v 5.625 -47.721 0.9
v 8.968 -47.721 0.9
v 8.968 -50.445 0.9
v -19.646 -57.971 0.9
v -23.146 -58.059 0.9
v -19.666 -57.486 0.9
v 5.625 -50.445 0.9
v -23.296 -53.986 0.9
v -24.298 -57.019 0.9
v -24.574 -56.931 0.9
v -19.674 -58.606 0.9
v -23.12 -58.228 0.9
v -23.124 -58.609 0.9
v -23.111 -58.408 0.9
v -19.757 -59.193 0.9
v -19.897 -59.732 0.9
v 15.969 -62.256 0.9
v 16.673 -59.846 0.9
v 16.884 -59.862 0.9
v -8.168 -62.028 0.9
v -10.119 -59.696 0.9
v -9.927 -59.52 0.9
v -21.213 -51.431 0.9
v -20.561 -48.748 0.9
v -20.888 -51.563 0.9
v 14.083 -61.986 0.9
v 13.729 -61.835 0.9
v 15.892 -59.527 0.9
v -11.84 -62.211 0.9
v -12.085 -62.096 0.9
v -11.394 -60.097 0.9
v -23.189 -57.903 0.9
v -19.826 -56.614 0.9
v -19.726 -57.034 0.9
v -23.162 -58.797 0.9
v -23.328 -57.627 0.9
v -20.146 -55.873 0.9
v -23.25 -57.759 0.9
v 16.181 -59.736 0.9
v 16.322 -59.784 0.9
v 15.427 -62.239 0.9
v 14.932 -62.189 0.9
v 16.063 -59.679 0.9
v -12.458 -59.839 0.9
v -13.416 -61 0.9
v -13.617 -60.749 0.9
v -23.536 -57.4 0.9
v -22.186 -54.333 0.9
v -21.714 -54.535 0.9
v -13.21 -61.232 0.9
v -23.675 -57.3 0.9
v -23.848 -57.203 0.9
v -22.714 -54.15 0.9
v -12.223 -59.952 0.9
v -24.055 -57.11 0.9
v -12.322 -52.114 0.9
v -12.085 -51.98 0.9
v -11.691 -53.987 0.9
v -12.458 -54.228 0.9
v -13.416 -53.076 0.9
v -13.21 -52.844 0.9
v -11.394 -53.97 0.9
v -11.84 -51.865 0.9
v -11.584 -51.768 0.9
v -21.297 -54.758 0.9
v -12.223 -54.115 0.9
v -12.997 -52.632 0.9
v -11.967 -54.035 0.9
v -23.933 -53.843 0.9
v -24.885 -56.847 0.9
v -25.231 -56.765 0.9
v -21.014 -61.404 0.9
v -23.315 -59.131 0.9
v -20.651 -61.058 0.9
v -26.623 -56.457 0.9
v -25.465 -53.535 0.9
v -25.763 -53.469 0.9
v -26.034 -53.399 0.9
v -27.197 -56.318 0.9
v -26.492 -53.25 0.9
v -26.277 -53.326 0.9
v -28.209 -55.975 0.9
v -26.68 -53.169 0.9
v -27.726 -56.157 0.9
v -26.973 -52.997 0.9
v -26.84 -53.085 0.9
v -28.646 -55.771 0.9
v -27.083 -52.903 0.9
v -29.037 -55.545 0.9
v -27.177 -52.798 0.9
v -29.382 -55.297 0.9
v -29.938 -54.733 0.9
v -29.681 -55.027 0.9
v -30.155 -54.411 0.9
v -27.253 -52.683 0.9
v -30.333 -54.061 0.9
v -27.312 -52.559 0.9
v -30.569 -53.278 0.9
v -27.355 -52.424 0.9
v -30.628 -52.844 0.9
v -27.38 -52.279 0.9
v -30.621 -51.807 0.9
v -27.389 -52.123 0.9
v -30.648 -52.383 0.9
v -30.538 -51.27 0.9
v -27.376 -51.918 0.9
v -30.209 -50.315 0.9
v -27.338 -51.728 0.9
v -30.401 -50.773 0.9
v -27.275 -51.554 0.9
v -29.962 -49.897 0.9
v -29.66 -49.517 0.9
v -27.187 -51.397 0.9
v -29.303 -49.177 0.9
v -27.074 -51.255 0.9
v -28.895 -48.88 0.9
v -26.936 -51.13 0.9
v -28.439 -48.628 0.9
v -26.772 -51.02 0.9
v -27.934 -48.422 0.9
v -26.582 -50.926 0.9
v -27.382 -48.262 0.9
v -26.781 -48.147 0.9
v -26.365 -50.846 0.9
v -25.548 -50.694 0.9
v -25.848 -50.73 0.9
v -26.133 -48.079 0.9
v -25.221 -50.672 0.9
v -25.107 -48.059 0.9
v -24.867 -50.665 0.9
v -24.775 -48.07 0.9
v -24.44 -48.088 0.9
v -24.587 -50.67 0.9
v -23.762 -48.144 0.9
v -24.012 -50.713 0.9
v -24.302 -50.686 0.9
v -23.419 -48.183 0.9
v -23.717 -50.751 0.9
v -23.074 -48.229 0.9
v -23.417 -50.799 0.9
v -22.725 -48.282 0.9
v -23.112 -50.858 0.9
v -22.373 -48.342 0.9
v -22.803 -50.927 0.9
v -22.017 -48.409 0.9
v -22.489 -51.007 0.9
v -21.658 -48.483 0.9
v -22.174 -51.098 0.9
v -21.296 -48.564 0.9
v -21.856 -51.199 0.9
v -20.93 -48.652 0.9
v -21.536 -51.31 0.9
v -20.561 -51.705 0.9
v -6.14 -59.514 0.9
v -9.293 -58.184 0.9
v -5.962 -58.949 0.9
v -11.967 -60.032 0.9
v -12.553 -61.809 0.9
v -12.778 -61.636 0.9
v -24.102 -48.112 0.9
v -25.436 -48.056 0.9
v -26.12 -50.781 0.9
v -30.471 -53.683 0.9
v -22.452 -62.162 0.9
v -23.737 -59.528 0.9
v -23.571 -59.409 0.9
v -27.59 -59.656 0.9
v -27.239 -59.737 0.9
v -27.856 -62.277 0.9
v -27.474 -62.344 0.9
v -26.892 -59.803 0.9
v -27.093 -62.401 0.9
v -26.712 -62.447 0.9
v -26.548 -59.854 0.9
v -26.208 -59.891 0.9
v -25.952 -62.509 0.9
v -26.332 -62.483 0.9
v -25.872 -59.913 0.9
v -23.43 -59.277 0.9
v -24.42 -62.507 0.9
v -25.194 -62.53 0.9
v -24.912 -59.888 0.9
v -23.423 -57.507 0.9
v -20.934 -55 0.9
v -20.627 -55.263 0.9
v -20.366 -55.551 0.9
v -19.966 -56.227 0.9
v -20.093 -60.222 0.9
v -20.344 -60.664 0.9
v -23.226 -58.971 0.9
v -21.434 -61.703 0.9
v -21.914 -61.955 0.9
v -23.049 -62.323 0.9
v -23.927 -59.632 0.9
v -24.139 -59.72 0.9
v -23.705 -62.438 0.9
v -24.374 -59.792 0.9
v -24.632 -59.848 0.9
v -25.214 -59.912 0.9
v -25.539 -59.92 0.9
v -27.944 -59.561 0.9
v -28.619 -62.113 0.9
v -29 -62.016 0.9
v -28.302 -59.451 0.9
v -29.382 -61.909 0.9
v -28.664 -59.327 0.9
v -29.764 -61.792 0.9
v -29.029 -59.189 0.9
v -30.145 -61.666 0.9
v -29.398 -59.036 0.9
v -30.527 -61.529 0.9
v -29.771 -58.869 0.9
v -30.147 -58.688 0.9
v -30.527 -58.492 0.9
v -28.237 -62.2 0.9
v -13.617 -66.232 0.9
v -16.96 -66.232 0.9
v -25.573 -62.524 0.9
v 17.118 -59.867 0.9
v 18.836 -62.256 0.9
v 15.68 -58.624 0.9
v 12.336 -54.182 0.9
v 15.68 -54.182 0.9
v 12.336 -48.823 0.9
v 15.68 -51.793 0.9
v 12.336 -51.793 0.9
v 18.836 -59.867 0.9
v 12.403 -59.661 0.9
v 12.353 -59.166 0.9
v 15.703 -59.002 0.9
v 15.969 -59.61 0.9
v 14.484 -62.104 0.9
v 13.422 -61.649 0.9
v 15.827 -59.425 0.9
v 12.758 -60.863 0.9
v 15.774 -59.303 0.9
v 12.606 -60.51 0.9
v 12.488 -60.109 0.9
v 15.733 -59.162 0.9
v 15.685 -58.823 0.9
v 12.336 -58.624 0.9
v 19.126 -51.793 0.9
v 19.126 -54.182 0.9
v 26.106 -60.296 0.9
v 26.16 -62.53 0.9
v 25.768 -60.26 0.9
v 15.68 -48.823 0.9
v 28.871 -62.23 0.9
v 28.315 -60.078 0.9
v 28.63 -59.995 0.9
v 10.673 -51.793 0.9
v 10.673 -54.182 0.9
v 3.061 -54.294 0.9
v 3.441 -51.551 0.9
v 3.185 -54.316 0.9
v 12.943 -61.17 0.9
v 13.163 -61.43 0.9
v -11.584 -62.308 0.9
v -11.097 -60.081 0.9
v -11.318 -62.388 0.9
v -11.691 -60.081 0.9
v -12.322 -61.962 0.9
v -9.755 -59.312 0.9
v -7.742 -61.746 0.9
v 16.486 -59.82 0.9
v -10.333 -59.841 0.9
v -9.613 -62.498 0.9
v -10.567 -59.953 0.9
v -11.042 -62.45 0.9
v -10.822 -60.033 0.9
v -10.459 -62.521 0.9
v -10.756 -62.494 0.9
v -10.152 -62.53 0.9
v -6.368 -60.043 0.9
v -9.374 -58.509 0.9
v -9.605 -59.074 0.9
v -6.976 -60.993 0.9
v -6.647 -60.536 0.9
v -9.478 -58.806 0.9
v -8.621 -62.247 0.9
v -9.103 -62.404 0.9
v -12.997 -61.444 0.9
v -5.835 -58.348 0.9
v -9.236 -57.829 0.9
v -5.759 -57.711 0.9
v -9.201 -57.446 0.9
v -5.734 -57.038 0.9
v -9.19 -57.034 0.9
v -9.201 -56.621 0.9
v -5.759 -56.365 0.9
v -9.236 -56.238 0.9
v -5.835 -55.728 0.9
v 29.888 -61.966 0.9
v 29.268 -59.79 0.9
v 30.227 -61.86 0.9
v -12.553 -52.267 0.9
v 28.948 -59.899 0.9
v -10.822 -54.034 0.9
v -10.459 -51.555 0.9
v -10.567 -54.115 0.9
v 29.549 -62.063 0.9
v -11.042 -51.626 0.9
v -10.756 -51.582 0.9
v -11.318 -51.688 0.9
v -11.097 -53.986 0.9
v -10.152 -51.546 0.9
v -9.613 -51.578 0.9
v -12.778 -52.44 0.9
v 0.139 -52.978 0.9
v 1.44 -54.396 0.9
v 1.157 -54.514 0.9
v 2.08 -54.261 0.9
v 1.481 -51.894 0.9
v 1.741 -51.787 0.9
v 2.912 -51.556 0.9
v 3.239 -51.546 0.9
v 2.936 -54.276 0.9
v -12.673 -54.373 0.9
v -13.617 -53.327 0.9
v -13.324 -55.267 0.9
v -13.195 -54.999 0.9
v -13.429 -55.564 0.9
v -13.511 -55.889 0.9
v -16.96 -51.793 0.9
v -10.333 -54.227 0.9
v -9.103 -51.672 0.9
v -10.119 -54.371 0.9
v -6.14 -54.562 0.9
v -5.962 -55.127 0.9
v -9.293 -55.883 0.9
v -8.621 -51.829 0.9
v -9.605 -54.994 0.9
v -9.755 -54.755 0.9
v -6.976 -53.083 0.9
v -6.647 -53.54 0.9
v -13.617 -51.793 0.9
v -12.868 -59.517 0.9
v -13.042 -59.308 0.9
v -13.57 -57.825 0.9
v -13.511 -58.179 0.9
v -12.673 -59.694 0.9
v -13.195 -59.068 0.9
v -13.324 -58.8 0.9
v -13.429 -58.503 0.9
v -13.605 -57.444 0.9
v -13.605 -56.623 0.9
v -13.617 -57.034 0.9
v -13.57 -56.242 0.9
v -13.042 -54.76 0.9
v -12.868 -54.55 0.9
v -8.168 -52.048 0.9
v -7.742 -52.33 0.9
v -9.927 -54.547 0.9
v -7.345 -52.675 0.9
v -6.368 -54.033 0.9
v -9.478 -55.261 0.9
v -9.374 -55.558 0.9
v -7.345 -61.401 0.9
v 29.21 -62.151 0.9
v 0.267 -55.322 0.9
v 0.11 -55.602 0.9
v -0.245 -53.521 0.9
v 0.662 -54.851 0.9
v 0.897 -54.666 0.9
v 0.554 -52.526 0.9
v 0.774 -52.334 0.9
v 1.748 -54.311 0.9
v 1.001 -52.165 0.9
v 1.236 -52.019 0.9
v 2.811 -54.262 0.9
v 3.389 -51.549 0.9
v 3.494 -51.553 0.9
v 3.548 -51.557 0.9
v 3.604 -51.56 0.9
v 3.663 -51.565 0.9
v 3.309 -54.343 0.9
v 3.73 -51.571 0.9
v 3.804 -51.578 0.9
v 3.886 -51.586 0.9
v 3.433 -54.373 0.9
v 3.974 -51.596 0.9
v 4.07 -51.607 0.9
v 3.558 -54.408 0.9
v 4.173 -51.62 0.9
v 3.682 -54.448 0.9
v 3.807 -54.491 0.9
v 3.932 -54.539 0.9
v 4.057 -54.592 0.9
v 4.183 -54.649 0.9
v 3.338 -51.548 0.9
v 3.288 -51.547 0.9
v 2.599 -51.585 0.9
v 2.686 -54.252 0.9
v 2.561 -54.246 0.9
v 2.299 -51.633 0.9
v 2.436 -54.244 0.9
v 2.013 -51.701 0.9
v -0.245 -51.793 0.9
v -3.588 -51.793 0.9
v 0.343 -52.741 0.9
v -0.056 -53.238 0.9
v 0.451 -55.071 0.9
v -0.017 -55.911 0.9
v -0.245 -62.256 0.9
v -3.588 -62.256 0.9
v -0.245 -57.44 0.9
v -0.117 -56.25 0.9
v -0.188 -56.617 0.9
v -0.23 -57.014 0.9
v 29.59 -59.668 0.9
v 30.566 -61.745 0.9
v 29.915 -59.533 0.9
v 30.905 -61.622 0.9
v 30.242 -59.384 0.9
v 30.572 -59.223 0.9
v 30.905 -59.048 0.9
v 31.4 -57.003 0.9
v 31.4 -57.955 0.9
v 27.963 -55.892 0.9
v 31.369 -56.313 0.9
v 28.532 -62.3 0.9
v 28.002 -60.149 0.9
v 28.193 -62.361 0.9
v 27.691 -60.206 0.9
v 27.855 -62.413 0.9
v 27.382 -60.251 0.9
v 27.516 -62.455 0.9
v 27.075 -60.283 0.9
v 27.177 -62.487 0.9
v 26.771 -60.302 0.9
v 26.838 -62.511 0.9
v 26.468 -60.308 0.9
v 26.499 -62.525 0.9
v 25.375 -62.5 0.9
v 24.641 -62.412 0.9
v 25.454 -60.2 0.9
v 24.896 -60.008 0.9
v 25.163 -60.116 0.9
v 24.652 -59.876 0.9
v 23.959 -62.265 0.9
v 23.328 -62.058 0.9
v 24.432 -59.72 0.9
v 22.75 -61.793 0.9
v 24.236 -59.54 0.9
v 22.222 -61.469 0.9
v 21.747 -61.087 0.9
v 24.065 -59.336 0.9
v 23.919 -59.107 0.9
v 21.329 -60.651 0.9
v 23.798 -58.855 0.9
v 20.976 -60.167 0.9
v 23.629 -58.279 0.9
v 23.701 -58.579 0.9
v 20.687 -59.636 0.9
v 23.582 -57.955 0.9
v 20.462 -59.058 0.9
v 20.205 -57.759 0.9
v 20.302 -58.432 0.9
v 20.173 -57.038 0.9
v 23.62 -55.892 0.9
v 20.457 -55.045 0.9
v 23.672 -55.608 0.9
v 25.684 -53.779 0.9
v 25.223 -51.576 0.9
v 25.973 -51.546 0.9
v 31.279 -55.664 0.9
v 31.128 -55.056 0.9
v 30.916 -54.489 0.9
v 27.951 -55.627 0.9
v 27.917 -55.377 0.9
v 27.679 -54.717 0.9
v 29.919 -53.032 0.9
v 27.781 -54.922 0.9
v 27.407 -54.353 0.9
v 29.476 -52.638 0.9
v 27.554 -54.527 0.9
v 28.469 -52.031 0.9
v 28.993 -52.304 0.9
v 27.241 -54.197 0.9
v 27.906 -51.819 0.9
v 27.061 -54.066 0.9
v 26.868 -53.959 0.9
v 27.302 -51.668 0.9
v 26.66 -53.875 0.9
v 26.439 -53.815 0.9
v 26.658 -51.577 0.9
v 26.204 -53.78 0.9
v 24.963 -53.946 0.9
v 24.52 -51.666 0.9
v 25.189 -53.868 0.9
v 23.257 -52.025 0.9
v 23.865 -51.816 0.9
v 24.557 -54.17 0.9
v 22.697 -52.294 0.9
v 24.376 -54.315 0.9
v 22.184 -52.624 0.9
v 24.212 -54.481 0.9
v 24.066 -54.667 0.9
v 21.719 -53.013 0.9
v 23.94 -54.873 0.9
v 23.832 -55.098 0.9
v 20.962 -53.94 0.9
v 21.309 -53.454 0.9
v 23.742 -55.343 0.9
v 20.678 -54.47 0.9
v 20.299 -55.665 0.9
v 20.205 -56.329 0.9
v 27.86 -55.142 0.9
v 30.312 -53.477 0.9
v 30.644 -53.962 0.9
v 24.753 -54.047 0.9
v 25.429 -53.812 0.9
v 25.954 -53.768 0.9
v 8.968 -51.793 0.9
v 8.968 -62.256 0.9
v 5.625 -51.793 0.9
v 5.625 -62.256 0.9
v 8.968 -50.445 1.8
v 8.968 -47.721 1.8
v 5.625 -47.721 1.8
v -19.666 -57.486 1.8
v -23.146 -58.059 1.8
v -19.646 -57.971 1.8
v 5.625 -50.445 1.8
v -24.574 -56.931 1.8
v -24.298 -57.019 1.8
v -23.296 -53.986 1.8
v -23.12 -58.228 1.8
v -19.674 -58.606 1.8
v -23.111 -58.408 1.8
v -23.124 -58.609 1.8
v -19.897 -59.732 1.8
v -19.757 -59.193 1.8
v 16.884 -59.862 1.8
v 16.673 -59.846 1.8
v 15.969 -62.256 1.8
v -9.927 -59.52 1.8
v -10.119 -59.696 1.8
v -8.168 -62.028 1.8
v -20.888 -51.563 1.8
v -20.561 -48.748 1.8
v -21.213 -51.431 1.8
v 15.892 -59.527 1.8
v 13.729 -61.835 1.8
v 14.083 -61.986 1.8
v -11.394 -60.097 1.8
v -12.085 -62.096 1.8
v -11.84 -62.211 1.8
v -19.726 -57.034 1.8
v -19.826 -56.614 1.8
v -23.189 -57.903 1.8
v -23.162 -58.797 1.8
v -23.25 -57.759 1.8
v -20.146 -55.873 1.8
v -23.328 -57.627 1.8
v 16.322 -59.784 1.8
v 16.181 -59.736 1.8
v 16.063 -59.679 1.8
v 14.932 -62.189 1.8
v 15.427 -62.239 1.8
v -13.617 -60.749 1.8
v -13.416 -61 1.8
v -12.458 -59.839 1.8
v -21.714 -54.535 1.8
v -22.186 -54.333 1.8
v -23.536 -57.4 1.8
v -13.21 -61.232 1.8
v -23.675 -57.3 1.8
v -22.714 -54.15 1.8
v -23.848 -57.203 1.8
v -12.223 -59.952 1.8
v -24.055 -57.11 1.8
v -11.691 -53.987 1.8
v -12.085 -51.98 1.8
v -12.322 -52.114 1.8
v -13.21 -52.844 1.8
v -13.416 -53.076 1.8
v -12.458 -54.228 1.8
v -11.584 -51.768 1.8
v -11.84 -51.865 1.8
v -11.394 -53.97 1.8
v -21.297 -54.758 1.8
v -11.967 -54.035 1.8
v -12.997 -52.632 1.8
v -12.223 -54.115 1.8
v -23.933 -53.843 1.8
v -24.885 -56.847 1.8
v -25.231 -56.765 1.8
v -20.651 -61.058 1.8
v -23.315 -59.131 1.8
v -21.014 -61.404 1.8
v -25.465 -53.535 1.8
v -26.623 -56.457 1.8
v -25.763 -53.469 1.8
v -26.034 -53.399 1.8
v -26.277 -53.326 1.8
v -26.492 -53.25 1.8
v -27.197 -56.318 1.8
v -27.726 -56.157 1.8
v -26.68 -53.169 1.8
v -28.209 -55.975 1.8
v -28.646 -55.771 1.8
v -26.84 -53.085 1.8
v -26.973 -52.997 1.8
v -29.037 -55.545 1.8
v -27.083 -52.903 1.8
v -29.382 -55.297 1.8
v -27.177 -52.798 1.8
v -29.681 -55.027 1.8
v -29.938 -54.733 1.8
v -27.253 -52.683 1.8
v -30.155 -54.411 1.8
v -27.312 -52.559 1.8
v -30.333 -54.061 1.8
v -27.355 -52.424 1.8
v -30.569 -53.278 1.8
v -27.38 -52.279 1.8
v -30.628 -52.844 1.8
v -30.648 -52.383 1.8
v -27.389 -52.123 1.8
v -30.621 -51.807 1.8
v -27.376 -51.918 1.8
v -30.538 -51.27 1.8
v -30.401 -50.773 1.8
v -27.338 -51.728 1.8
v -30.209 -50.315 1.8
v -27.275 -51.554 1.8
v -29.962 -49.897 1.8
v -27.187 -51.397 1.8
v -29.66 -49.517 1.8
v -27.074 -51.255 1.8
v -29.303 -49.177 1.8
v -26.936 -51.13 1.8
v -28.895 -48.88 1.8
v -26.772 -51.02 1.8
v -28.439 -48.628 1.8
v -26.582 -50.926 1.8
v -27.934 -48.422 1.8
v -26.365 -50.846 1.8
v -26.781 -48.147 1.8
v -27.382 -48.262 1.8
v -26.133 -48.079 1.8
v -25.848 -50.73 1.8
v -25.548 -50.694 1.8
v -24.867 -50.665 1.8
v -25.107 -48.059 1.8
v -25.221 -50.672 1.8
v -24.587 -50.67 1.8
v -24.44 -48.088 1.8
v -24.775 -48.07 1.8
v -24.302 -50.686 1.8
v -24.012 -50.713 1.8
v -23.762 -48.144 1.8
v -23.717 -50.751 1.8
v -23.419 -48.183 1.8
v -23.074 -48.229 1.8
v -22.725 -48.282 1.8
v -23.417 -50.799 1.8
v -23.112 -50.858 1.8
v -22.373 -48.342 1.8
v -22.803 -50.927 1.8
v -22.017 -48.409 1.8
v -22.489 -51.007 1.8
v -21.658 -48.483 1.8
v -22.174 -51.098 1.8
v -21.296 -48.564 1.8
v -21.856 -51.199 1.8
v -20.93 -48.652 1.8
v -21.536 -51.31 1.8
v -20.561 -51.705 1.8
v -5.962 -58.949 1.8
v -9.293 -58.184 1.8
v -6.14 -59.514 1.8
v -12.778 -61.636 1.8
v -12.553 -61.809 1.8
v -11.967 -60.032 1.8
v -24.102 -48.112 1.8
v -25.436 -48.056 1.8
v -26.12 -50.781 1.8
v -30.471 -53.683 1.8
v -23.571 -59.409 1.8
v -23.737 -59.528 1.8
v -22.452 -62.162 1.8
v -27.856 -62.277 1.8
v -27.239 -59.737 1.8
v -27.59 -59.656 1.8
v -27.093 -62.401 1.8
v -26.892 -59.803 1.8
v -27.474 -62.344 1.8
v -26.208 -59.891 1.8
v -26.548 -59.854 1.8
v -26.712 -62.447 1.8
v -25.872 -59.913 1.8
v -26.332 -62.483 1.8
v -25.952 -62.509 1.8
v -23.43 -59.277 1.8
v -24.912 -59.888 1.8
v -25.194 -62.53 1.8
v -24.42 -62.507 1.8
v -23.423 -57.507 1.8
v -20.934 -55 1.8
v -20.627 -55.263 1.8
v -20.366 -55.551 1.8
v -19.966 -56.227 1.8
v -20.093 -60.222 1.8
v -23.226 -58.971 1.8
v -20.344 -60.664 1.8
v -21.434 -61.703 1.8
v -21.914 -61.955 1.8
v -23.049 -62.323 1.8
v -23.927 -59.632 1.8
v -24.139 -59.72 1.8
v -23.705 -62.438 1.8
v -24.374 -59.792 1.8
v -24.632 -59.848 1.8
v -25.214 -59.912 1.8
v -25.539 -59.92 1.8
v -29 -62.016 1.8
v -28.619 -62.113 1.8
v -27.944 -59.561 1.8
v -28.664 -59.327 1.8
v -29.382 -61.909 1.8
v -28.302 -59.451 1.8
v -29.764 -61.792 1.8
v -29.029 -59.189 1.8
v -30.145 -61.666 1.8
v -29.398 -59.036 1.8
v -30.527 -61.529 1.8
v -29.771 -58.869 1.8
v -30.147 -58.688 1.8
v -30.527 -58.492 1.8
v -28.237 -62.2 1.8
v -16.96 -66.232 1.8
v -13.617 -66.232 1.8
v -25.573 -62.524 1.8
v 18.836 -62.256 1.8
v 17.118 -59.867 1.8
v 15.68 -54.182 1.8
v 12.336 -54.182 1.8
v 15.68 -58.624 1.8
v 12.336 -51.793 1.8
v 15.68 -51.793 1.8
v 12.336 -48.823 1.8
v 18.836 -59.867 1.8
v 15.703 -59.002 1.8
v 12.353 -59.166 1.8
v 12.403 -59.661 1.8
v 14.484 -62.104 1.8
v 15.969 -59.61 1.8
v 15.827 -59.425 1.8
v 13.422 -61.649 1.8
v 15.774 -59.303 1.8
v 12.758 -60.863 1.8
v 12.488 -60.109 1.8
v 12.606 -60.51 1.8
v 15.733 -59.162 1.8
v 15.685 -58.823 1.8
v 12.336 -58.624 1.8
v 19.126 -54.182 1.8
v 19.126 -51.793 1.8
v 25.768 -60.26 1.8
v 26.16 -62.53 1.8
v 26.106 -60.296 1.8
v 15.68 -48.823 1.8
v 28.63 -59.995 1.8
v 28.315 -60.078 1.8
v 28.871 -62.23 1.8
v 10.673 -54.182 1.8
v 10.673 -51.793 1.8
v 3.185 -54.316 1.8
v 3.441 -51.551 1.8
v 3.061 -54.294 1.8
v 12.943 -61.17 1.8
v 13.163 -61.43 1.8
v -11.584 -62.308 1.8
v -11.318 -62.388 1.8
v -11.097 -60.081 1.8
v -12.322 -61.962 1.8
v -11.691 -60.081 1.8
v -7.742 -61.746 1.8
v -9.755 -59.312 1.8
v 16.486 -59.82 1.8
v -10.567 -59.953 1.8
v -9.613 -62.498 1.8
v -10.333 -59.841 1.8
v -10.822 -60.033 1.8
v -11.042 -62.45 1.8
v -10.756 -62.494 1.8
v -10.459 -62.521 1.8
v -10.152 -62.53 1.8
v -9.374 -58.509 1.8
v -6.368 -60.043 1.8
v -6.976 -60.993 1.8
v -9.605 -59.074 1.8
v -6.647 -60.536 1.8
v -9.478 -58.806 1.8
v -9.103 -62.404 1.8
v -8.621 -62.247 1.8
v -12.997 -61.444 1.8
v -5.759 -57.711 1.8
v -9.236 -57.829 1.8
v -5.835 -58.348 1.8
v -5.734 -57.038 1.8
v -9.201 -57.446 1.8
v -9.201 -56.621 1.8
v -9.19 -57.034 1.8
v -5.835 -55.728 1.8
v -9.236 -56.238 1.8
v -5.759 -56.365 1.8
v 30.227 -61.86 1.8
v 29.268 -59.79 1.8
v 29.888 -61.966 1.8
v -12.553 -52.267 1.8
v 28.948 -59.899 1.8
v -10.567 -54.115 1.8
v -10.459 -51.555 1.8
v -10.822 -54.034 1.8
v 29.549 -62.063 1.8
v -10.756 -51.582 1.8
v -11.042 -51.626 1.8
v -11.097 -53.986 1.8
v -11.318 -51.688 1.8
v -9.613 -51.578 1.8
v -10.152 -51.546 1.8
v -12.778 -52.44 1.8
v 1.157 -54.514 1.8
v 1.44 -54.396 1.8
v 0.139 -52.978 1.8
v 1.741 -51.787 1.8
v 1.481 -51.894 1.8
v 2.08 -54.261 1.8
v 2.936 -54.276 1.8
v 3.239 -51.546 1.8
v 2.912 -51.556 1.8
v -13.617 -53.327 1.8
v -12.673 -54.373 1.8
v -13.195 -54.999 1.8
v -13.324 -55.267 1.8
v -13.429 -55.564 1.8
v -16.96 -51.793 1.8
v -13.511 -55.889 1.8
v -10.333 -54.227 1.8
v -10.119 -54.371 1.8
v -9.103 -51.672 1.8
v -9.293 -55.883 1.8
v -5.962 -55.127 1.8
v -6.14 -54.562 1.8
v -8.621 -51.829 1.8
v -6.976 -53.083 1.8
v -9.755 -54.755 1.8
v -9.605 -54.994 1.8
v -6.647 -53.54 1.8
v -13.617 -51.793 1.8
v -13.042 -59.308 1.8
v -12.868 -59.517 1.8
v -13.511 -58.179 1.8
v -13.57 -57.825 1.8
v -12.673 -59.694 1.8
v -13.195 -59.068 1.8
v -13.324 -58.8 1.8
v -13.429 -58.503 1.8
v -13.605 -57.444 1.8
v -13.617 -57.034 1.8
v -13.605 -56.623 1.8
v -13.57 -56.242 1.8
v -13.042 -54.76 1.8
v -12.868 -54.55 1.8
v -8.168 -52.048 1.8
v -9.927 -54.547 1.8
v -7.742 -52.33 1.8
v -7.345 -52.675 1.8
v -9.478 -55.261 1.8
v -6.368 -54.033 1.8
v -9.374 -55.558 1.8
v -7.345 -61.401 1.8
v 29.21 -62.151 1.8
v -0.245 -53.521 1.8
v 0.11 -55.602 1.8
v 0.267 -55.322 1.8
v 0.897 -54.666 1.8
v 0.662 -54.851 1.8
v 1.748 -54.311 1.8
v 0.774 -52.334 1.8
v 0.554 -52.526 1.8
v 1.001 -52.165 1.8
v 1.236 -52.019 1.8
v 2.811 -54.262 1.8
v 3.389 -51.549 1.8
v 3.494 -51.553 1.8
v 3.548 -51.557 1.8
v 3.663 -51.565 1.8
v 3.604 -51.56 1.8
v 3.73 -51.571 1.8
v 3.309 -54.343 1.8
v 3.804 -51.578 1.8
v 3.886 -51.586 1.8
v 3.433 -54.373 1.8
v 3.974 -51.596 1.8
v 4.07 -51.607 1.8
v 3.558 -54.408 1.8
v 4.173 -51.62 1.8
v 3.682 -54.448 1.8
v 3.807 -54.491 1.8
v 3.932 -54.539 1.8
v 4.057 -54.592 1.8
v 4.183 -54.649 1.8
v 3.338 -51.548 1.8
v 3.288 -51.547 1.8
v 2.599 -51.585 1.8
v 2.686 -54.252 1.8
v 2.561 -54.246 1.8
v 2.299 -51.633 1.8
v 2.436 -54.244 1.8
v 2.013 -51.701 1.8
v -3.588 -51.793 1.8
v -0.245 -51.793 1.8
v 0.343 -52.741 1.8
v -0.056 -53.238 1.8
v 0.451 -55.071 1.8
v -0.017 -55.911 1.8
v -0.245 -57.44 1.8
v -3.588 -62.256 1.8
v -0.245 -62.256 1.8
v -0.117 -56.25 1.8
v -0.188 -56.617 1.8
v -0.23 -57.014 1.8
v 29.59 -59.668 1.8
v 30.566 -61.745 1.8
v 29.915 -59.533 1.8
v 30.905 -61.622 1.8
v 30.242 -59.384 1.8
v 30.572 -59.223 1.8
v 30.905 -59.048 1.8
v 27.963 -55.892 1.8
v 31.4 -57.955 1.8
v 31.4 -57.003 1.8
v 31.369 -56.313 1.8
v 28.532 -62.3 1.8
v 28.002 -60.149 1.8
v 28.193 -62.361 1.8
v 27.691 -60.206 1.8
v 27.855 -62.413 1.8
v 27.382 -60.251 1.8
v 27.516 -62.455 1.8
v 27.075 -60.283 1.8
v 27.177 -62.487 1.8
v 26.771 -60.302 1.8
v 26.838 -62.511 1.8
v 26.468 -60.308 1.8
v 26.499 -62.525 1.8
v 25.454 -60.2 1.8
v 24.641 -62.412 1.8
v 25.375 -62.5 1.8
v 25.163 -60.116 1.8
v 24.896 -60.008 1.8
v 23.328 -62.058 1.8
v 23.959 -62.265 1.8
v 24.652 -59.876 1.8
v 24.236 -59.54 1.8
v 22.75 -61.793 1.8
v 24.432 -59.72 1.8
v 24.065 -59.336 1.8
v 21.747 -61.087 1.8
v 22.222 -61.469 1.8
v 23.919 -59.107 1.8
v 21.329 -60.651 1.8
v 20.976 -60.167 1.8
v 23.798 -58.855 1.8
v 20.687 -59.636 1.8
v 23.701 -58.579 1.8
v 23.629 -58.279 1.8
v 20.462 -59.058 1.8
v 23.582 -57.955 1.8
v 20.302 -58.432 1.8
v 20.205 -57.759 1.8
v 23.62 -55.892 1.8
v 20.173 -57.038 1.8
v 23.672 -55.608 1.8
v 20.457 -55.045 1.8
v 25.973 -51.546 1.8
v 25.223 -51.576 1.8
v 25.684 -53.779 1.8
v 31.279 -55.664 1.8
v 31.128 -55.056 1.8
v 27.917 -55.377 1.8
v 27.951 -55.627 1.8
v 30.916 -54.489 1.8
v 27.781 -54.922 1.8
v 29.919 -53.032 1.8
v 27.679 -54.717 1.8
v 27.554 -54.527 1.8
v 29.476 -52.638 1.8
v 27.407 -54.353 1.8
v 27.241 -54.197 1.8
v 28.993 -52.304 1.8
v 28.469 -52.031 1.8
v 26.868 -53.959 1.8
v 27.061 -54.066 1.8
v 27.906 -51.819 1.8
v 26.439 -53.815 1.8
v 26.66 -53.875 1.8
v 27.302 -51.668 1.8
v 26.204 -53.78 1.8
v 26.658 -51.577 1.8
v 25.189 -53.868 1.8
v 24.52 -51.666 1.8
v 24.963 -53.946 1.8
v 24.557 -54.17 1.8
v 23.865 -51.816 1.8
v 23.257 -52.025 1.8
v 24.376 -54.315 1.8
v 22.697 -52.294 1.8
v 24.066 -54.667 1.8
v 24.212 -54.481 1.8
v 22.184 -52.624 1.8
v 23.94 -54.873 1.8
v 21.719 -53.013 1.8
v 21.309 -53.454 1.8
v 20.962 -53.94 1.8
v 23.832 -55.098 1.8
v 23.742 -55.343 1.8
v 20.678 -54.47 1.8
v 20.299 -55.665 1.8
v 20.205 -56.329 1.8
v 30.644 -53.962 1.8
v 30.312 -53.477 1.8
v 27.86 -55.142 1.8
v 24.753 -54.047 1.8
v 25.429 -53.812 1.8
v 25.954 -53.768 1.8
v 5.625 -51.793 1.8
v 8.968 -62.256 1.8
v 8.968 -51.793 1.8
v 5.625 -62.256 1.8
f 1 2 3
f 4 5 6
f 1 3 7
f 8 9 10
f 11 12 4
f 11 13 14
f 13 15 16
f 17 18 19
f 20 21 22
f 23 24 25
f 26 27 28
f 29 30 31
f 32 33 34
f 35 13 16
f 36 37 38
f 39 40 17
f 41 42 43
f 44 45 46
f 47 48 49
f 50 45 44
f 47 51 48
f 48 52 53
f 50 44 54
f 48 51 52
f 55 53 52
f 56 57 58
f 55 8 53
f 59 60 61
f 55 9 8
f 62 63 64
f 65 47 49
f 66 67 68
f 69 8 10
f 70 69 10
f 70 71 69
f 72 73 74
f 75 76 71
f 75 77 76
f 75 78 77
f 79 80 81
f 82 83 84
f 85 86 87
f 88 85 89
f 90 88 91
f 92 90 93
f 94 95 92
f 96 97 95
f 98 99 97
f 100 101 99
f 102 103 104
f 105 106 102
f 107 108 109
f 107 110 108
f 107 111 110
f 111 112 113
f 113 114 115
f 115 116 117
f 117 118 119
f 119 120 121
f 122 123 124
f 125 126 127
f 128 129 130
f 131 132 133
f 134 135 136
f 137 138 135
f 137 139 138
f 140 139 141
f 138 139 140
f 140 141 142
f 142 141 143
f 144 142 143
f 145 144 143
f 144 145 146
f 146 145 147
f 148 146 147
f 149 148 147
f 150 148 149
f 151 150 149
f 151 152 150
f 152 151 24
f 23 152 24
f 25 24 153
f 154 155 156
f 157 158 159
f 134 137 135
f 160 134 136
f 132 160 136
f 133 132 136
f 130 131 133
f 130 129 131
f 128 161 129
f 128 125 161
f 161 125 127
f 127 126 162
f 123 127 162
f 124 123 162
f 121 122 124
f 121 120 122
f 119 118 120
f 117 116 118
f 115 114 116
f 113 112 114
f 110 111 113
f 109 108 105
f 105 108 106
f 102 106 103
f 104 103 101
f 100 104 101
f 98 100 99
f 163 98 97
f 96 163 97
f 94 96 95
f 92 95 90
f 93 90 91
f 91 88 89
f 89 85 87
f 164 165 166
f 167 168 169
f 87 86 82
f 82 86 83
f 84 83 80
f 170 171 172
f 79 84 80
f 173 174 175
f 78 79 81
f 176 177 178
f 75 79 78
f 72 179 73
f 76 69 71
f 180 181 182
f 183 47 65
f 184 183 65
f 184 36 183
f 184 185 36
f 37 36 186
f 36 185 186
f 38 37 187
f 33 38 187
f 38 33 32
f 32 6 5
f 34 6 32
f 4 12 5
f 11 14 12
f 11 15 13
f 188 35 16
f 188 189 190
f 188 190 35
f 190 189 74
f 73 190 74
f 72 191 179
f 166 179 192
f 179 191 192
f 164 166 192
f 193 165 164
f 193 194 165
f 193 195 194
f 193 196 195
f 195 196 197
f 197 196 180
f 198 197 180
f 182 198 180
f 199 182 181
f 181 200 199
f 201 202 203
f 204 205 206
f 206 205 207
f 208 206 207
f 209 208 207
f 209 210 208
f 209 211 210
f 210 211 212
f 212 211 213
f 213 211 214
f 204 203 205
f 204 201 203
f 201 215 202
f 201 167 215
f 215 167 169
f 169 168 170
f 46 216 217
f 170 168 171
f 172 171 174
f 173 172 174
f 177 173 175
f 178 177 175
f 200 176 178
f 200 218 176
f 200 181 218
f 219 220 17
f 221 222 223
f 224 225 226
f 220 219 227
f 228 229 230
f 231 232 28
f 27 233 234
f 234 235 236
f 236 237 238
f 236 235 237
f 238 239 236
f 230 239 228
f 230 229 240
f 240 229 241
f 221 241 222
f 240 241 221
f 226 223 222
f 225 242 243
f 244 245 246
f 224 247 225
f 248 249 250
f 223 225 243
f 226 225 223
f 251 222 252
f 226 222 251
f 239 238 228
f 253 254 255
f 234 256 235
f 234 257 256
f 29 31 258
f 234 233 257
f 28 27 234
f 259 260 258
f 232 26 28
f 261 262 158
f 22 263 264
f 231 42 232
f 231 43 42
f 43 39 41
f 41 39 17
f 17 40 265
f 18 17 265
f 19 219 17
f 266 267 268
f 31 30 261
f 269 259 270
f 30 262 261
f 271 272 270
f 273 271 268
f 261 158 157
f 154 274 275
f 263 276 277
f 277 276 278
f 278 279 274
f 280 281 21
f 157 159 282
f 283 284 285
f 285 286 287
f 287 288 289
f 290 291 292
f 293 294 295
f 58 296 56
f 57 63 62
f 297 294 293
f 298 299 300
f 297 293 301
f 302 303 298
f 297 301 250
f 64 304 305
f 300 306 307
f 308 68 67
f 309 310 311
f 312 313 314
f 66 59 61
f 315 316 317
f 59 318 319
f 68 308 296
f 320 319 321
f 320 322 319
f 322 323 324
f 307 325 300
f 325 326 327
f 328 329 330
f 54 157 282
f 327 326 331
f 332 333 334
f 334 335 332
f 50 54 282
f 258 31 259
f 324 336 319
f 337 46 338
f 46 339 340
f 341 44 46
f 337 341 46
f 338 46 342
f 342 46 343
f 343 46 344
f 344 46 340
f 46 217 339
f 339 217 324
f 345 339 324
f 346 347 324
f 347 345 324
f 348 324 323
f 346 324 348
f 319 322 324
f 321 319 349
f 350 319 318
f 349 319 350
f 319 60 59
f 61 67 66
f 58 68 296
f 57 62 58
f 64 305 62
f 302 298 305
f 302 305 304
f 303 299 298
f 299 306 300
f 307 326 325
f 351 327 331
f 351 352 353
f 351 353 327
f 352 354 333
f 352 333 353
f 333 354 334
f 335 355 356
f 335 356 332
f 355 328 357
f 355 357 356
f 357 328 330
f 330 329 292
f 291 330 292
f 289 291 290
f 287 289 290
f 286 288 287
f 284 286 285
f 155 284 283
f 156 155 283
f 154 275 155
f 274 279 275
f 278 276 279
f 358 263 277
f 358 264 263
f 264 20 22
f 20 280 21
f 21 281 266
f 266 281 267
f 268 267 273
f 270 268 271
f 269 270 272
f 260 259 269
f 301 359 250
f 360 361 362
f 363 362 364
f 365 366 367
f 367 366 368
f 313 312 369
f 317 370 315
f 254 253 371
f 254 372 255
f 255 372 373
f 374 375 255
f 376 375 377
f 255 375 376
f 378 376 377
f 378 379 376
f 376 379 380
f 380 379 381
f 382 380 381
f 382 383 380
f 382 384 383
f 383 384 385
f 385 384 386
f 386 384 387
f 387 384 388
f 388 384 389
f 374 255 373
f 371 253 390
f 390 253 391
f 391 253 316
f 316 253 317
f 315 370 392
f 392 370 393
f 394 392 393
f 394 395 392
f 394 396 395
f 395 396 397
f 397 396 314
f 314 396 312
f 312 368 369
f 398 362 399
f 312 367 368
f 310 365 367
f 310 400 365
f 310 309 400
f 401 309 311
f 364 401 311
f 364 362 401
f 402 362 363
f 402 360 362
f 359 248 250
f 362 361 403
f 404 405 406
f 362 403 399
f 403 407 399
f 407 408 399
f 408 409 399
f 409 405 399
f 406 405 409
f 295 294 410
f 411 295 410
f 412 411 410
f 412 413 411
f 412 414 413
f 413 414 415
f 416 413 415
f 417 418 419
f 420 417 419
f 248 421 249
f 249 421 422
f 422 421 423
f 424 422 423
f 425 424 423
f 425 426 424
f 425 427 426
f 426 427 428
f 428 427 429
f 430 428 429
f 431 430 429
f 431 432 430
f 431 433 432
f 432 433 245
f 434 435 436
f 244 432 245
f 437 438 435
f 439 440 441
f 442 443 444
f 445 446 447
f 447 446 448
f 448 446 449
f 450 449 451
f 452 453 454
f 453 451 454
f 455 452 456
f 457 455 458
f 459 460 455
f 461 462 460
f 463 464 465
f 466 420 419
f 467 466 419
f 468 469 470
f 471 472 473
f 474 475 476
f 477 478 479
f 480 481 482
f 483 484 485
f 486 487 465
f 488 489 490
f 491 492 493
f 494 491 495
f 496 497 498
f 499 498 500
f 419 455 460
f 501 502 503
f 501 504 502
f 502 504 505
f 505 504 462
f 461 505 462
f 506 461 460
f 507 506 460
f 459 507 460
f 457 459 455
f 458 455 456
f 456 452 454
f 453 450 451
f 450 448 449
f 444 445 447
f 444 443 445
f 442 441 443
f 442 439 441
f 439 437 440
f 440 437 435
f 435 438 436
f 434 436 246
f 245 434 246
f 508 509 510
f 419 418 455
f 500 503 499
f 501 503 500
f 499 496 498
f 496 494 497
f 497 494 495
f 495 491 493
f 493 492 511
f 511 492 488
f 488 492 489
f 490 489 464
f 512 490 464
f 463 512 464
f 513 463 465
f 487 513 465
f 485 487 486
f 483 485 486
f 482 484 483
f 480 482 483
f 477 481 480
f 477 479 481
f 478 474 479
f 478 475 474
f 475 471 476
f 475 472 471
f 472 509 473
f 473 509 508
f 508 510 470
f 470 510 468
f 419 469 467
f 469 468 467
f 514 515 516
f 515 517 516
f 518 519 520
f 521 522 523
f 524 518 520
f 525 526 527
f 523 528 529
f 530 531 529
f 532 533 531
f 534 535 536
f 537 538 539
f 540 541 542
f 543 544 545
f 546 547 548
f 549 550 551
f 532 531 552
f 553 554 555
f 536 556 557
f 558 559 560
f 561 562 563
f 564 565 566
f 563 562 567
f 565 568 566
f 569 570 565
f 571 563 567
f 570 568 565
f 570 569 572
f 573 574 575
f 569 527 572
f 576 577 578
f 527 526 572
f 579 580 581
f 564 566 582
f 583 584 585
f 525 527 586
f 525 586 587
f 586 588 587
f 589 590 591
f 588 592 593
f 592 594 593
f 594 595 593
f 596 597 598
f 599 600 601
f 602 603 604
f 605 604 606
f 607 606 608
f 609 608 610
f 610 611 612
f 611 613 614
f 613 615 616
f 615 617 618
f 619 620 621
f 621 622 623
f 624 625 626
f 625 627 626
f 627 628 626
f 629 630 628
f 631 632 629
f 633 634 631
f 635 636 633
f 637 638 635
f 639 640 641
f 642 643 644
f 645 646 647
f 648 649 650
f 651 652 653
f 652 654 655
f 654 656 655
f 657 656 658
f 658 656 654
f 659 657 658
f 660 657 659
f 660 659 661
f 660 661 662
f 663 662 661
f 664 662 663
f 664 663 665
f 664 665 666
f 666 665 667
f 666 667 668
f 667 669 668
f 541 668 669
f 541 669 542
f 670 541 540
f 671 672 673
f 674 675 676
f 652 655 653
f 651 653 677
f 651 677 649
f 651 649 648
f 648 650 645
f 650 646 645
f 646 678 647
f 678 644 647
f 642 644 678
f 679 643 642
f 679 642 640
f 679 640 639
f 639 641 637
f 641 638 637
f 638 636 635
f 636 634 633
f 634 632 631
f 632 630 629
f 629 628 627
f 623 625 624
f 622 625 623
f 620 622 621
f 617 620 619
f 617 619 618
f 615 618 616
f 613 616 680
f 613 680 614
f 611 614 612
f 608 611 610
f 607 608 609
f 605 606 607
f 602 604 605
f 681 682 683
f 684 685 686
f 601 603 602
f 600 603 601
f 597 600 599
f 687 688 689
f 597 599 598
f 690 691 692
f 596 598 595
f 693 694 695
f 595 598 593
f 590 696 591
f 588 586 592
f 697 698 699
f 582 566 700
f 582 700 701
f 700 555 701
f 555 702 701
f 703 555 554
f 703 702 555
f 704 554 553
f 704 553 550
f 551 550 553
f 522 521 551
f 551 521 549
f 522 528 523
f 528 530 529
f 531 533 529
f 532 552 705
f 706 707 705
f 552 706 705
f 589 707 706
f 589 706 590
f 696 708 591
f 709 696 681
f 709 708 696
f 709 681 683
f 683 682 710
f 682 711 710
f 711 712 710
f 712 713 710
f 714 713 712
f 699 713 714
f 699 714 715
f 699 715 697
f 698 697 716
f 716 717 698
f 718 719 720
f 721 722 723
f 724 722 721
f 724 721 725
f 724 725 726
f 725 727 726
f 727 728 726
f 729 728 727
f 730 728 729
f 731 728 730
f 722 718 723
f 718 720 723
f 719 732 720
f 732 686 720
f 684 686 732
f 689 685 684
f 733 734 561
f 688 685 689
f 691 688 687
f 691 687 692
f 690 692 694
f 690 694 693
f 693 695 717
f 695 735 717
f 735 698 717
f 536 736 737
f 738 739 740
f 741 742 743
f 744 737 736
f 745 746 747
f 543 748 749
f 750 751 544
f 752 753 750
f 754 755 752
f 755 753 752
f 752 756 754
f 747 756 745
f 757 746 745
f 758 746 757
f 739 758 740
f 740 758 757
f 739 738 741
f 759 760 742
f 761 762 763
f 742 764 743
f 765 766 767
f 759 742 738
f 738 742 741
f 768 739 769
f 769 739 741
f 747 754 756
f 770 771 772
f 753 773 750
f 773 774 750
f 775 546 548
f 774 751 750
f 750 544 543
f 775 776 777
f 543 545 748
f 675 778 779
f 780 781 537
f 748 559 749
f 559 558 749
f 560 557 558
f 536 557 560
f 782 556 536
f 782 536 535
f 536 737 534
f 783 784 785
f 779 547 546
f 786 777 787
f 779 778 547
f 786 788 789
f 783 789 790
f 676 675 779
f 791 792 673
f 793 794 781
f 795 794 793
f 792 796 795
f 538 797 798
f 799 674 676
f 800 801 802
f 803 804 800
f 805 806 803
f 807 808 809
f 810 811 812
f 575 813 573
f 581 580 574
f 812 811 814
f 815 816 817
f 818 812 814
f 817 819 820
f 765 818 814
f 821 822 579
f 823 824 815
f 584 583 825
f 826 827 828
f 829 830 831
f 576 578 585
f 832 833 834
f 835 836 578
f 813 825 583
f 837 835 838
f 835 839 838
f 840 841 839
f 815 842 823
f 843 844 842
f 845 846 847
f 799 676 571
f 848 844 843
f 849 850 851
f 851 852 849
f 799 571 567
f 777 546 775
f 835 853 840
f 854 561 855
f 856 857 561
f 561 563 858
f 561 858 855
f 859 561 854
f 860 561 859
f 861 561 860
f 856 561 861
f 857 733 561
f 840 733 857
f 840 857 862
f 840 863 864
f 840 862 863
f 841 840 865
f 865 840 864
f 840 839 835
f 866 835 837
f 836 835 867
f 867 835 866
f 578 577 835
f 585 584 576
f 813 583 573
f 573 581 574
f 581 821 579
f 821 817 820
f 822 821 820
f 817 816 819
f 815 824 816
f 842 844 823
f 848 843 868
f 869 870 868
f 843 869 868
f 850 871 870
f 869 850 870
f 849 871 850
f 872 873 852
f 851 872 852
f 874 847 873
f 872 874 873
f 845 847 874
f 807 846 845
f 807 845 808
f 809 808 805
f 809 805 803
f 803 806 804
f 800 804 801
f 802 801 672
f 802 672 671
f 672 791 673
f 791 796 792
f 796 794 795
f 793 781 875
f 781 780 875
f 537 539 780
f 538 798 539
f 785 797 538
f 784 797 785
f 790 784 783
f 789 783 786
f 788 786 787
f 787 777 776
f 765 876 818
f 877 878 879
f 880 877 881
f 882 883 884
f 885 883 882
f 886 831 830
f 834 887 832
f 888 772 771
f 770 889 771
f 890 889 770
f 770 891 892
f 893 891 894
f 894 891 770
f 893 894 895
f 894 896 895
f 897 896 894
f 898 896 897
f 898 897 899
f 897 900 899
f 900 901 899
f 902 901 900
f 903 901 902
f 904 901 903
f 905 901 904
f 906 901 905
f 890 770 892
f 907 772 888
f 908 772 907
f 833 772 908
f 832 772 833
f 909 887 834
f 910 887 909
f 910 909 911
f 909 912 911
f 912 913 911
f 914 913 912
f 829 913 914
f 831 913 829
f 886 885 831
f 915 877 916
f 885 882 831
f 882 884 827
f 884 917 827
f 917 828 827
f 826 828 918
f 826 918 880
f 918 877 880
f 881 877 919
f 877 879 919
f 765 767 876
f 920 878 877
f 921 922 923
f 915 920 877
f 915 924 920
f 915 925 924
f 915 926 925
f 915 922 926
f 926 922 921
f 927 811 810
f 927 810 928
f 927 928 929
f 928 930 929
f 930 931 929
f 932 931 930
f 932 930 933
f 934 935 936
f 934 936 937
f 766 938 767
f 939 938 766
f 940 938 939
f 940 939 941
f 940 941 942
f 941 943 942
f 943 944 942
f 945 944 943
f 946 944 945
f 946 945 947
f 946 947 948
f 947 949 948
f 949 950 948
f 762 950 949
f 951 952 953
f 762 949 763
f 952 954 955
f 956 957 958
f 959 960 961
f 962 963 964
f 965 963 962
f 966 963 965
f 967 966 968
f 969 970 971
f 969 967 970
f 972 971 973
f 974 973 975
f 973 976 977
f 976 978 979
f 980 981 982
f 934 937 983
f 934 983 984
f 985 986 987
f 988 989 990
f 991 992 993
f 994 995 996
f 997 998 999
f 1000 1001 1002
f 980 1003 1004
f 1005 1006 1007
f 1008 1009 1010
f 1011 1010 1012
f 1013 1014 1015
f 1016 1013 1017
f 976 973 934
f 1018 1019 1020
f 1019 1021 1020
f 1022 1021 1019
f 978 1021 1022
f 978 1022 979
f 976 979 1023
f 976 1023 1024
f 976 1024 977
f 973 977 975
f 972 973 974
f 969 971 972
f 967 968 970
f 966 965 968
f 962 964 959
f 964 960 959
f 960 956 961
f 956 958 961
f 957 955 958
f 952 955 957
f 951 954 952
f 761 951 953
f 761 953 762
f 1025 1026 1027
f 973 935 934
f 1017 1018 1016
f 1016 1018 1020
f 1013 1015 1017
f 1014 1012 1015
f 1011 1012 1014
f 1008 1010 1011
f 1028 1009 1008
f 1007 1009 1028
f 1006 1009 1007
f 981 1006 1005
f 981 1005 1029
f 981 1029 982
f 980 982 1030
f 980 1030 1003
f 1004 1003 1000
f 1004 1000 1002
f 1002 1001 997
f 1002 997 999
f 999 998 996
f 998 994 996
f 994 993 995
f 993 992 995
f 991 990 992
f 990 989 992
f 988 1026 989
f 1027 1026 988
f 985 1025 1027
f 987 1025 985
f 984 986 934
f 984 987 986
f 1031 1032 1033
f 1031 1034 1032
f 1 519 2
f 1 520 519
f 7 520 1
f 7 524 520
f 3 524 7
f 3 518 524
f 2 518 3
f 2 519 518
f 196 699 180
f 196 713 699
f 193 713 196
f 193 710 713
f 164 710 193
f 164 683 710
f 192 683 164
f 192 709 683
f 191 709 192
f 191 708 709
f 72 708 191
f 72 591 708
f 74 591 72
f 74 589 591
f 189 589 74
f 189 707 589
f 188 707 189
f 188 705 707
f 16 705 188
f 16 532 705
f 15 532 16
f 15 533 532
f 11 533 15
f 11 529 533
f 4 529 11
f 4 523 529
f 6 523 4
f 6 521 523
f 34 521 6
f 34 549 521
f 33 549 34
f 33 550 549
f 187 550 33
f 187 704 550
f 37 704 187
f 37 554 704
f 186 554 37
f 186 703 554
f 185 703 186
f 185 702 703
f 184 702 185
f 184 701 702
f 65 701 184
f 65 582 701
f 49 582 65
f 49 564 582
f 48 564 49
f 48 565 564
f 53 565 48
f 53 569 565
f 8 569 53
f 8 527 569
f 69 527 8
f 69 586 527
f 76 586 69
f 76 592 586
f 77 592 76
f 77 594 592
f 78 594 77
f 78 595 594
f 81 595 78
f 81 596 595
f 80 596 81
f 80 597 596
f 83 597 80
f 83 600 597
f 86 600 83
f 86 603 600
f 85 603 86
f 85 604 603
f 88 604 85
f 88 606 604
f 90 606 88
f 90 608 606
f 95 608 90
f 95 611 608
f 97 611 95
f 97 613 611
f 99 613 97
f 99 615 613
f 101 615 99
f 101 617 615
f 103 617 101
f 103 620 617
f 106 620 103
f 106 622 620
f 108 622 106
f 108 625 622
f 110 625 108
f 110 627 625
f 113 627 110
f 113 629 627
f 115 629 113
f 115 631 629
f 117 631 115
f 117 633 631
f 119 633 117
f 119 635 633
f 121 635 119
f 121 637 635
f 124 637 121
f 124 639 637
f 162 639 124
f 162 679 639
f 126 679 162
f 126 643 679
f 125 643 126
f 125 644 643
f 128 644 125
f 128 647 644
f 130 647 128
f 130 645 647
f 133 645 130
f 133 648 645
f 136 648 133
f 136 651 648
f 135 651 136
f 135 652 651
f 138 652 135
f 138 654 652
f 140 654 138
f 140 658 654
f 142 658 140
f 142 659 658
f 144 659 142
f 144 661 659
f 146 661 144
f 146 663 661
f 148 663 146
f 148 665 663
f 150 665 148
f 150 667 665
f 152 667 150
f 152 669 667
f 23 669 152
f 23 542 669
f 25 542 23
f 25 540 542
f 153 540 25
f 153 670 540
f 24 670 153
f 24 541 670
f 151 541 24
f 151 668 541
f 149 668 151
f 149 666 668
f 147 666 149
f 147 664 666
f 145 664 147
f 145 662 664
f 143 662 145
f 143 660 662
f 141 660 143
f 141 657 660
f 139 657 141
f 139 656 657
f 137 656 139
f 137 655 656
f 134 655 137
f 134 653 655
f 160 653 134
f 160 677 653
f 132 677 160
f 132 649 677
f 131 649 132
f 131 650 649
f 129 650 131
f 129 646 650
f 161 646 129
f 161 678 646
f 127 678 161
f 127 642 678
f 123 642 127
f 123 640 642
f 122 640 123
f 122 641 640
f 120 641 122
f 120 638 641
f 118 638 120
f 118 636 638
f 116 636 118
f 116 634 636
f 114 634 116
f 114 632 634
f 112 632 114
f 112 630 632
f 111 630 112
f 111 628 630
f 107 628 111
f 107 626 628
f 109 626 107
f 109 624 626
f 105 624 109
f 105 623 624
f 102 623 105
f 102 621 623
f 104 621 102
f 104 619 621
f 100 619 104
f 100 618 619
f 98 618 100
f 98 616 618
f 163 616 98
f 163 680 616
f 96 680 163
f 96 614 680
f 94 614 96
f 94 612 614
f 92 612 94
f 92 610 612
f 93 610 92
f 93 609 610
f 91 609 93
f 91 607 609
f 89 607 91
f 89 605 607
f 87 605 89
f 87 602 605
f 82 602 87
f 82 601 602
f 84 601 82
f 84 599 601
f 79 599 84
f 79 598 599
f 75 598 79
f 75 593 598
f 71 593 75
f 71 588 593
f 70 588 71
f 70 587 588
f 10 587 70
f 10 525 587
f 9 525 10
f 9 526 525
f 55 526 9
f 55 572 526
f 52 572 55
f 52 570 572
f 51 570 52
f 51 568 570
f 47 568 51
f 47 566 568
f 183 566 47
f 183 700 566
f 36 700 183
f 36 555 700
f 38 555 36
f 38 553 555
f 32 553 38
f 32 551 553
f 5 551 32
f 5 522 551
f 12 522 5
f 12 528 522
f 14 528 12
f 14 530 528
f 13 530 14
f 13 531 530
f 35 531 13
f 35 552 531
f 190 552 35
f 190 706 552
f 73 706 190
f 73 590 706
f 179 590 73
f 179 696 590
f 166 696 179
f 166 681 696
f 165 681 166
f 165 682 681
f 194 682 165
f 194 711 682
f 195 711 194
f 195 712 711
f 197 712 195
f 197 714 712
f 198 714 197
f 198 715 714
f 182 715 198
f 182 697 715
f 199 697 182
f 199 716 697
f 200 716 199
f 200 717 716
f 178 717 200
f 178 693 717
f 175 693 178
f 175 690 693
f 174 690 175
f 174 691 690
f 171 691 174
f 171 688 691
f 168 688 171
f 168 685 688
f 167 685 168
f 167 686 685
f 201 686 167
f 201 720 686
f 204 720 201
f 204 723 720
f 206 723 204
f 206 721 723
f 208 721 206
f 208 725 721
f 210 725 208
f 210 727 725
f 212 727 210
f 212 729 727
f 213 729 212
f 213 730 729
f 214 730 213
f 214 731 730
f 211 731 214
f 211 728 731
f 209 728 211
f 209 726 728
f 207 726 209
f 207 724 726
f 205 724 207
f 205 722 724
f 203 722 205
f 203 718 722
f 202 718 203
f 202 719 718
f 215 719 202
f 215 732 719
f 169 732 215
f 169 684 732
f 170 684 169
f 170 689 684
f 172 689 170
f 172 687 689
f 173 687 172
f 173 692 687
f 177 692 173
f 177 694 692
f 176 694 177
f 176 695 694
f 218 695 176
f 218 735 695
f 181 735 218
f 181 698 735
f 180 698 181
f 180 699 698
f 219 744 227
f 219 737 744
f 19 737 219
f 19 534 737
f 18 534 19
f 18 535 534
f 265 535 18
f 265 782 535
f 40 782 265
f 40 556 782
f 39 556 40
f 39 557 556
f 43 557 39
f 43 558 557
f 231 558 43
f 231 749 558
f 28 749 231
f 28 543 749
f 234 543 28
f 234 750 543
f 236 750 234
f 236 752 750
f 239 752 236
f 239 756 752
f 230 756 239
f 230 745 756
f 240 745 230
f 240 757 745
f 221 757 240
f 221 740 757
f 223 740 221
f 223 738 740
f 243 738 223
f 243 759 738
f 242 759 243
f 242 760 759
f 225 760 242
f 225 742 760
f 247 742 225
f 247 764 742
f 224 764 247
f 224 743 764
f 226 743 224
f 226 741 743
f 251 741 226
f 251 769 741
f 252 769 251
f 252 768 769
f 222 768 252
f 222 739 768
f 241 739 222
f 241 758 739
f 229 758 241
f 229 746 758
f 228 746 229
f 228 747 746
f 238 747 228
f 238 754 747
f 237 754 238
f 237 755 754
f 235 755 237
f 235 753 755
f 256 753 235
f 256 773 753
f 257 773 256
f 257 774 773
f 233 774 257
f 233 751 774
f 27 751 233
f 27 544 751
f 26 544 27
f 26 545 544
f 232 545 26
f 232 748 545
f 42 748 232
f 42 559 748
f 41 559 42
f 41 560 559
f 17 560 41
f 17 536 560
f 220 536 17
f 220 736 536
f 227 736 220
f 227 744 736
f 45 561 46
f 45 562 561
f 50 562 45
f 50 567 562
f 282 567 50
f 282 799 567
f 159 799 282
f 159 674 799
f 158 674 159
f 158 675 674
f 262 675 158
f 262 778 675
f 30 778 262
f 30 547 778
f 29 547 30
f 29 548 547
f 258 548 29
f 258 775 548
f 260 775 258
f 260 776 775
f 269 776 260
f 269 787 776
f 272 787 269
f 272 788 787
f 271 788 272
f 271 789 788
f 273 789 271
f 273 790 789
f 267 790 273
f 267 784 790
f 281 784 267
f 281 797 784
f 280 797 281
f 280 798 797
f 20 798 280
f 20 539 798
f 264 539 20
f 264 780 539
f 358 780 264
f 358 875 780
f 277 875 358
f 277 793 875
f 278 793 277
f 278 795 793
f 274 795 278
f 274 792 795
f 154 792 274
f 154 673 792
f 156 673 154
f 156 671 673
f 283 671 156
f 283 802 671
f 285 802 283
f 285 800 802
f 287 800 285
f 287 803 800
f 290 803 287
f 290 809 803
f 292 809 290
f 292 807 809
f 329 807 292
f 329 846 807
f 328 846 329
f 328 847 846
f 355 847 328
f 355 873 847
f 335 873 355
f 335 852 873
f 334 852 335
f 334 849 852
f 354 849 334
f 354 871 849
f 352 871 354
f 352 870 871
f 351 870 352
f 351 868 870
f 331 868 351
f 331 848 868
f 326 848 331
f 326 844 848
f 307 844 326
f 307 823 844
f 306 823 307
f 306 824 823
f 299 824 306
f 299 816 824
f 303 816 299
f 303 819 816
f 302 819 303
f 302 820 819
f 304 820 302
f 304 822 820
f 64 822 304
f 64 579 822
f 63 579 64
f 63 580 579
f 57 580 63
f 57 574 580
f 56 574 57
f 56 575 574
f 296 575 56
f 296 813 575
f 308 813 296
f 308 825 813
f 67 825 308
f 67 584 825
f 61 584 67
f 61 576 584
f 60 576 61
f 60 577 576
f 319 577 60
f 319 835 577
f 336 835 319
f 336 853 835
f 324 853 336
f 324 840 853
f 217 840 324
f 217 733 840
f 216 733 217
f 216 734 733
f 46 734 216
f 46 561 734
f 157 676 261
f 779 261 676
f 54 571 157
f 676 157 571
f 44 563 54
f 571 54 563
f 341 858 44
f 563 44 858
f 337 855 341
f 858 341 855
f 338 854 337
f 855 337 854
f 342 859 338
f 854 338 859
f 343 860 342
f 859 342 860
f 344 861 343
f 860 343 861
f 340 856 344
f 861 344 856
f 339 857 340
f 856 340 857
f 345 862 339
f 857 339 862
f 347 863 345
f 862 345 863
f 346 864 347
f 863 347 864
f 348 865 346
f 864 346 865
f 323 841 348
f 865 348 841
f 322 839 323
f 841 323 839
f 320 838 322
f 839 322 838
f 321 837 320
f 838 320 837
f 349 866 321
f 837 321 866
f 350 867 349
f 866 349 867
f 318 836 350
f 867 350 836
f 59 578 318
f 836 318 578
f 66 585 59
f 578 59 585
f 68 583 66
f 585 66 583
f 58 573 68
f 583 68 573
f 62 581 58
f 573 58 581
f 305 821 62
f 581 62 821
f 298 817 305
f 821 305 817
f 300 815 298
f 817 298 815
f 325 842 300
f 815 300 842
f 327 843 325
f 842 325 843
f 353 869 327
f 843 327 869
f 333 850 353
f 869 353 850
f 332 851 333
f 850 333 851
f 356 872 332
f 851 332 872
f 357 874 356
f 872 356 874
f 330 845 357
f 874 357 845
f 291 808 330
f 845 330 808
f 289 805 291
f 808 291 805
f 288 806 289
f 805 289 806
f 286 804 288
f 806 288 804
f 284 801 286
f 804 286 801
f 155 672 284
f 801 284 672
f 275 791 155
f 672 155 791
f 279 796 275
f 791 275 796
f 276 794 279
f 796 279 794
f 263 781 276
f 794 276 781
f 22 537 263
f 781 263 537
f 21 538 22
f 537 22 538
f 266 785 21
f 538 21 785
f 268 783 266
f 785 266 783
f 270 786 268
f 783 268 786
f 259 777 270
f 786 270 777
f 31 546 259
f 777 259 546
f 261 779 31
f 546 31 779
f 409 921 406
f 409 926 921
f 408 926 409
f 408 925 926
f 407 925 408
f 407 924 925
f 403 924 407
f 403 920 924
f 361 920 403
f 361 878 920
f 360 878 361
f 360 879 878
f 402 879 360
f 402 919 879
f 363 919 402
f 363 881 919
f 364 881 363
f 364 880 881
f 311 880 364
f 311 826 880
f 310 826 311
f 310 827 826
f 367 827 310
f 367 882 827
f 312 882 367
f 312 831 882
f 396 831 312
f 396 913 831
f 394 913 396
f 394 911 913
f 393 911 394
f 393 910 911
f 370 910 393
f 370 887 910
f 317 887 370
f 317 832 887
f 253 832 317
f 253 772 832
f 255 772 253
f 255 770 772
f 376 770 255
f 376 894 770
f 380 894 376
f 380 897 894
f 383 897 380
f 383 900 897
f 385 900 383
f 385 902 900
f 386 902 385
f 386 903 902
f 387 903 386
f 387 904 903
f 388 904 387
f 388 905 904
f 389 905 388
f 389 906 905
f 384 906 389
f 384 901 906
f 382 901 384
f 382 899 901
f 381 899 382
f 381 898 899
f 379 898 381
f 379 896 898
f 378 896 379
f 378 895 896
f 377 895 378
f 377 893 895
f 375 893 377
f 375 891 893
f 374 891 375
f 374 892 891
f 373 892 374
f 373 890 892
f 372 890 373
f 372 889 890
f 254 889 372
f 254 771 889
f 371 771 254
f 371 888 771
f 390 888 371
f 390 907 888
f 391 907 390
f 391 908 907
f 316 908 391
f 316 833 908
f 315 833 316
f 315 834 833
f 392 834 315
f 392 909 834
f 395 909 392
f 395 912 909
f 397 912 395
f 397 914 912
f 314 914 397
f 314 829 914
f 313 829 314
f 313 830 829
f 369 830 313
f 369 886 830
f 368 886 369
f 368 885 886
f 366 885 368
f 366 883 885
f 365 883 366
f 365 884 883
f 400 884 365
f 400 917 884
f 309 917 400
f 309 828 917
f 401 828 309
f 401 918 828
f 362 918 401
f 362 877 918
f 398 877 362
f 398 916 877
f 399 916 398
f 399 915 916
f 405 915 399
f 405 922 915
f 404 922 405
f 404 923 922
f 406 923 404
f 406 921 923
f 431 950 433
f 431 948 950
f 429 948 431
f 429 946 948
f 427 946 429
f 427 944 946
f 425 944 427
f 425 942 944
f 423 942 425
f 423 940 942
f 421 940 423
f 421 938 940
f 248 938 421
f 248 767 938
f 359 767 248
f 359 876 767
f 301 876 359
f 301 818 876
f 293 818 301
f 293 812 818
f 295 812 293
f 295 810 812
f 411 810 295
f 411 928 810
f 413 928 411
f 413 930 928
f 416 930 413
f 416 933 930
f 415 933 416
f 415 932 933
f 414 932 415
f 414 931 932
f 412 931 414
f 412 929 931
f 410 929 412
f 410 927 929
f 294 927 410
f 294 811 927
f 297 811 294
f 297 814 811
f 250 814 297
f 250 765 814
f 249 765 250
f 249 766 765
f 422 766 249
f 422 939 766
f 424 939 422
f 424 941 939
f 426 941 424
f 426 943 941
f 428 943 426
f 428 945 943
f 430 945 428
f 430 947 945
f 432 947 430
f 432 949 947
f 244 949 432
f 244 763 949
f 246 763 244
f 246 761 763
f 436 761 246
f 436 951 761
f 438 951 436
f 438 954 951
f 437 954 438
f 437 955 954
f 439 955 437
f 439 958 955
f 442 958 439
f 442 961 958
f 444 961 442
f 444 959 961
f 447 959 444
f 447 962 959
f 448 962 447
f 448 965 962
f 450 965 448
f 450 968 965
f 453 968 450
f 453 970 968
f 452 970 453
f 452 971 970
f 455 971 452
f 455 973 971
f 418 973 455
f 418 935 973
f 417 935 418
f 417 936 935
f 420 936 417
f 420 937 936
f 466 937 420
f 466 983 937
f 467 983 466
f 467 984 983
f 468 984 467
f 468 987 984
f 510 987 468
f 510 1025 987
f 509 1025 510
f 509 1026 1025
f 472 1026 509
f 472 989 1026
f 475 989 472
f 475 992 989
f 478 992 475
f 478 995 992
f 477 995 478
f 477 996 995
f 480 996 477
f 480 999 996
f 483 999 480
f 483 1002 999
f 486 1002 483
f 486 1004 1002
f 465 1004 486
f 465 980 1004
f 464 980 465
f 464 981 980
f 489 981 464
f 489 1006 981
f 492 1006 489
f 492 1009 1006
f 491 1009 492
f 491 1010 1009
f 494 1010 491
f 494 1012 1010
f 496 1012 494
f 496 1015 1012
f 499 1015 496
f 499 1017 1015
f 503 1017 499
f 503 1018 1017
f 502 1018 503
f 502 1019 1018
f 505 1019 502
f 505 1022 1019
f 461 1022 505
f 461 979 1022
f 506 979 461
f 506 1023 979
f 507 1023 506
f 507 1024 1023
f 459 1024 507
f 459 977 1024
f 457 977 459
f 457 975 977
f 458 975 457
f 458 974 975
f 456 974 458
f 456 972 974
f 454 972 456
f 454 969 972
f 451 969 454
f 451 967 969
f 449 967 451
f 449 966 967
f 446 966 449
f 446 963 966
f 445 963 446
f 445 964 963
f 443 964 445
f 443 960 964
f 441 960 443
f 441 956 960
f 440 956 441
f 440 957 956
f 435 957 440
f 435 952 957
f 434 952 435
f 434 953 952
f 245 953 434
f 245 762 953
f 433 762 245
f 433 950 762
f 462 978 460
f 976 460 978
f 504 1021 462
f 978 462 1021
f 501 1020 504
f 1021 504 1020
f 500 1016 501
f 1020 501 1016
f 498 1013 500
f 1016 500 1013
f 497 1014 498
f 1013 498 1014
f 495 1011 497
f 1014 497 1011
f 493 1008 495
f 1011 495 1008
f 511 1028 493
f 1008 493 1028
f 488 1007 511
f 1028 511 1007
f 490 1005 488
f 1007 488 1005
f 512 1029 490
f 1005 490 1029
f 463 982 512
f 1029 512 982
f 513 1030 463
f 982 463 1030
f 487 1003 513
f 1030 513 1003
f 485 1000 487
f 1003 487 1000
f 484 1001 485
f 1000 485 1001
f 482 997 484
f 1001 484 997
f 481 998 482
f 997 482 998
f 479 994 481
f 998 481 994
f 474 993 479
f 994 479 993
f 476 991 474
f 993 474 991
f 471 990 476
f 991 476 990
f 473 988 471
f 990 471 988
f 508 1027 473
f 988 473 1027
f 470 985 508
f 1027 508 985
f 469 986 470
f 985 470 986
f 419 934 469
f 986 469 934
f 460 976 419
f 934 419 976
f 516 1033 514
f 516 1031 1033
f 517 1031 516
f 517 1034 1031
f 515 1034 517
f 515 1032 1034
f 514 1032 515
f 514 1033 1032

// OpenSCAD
$fn = 48;
  // English (below bottom hole)
  translate([0, -57.100, 0.900]) linear_extrude(height=0.900) text("Sprite", size=13.773, halign="center", valign="center", font="Helvetica Neue:style=Bold");
